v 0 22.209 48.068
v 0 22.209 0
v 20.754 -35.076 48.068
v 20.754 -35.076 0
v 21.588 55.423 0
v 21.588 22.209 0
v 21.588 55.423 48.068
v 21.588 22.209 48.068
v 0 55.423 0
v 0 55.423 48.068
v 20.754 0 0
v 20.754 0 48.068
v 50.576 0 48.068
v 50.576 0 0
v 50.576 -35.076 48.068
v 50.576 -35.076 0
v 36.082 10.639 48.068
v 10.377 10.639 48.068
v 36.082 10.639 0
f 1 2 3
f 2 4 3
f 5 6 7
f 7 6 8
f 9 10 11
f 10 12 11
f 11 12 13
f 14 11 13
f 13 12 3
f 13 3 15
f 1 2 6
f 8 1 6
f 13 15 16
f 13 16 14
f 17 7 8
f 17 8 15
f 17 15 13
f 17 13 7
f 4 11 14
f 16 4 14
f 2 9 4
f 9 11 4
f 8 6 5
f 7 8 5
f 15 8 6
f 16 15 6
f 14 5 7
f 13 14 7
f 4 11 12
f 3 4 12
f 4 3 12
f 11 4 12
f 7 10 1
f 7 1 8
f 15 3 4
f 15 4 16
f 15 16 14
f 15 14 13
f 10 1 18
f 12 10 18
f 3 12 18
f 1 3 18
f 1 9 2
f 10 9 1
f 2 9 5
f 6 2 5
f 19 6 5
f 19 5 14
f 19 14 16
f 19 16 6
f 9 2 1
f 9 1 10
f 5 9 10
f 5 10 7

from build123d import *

# Parameters (mm, degrees)
F0_W       = 29.82192114
F0_H       = 35.0757315755
F1_DEPTH   = 48.0683129281
F0_W_2     = 21.5881094337
F0_H_2     = 33.2140550017
F1_FACE_W  = 33.2140550017
F1_FACE_H  = 48.0683129281
F1_FACE1_W = 35.0757315755
F1_FACE1_H = 48.0683129281
F1_FACE2_W = 33.2140550017
F1_FACE2_H = 48.0683129281
F1_FACE3_W = 35.0757315755
F1_FACE3_H = 48.0683129281


with BuildPart() as f1:
    # F0 (on Top) → F1 (new body)
    with BuildSketch(Plane.XY):
        with Locations((35.6653165072, -17.5378657877)):
            Rectangle(F0_W, F0_H)
    extrude(amount=F1_DEPTH)


with BuildPart() as f1b:
    # F0 (on Top) → F1, piece 2 (new body)
    with BuildSketch(Plane.XY):
        with Locations((10.7940547168, 38.8156585395)):
            Rectangle(F0_W_2, F0_H_2)
    extrude(amount=F1_DEPTH)


with BuildPart() as f2:
    # F1_face (on face) → F2 section 0
    with BuildSketch(Plane(origin=(21.5881094337, 38.8156585395, 24.034156464), x_dir=(0, 1, 0), z_dir=(1, 0, 0))):
        Rectangle(F1_FACE_W, F1_FACE_H)
    # F1_face1 (on face) → F2 section 1
    with BuildSketch(Plane(origin=(50.5762770772, -17.5378657877, 24.034156464), x_dir=(0, 1, 0), z_dir=(1, 0, 0))):
        Rectangle(F1_FACE1_W, F1_FACE1_H)
    loft()


with BuildPart() as f3:
    # F1_face2 (on face) → F3 section 0
    with BuildSketch(Plane(origin=(0, 38.8156585395, 24.034156464), x_dir=(0, -1, 0), z_dir=(-1, 0, 0))):
        Rectangle(F1_FACE2_W, F1_FACE2_H)
    # F1_face3 (on face) → F3 section 1
    with BuildSketch(Plane(origin=(20.7543559372, -17.5378657877, 24.034156464), x_dir=(0, -1, 0), z_dir=(-1, 0, 0))):
        Rectangle(F1_FACE3_W, F1_FACE3_H)
    loft()


solid = Compound([f1.part, f1b.part, f2.part, f3.part])
